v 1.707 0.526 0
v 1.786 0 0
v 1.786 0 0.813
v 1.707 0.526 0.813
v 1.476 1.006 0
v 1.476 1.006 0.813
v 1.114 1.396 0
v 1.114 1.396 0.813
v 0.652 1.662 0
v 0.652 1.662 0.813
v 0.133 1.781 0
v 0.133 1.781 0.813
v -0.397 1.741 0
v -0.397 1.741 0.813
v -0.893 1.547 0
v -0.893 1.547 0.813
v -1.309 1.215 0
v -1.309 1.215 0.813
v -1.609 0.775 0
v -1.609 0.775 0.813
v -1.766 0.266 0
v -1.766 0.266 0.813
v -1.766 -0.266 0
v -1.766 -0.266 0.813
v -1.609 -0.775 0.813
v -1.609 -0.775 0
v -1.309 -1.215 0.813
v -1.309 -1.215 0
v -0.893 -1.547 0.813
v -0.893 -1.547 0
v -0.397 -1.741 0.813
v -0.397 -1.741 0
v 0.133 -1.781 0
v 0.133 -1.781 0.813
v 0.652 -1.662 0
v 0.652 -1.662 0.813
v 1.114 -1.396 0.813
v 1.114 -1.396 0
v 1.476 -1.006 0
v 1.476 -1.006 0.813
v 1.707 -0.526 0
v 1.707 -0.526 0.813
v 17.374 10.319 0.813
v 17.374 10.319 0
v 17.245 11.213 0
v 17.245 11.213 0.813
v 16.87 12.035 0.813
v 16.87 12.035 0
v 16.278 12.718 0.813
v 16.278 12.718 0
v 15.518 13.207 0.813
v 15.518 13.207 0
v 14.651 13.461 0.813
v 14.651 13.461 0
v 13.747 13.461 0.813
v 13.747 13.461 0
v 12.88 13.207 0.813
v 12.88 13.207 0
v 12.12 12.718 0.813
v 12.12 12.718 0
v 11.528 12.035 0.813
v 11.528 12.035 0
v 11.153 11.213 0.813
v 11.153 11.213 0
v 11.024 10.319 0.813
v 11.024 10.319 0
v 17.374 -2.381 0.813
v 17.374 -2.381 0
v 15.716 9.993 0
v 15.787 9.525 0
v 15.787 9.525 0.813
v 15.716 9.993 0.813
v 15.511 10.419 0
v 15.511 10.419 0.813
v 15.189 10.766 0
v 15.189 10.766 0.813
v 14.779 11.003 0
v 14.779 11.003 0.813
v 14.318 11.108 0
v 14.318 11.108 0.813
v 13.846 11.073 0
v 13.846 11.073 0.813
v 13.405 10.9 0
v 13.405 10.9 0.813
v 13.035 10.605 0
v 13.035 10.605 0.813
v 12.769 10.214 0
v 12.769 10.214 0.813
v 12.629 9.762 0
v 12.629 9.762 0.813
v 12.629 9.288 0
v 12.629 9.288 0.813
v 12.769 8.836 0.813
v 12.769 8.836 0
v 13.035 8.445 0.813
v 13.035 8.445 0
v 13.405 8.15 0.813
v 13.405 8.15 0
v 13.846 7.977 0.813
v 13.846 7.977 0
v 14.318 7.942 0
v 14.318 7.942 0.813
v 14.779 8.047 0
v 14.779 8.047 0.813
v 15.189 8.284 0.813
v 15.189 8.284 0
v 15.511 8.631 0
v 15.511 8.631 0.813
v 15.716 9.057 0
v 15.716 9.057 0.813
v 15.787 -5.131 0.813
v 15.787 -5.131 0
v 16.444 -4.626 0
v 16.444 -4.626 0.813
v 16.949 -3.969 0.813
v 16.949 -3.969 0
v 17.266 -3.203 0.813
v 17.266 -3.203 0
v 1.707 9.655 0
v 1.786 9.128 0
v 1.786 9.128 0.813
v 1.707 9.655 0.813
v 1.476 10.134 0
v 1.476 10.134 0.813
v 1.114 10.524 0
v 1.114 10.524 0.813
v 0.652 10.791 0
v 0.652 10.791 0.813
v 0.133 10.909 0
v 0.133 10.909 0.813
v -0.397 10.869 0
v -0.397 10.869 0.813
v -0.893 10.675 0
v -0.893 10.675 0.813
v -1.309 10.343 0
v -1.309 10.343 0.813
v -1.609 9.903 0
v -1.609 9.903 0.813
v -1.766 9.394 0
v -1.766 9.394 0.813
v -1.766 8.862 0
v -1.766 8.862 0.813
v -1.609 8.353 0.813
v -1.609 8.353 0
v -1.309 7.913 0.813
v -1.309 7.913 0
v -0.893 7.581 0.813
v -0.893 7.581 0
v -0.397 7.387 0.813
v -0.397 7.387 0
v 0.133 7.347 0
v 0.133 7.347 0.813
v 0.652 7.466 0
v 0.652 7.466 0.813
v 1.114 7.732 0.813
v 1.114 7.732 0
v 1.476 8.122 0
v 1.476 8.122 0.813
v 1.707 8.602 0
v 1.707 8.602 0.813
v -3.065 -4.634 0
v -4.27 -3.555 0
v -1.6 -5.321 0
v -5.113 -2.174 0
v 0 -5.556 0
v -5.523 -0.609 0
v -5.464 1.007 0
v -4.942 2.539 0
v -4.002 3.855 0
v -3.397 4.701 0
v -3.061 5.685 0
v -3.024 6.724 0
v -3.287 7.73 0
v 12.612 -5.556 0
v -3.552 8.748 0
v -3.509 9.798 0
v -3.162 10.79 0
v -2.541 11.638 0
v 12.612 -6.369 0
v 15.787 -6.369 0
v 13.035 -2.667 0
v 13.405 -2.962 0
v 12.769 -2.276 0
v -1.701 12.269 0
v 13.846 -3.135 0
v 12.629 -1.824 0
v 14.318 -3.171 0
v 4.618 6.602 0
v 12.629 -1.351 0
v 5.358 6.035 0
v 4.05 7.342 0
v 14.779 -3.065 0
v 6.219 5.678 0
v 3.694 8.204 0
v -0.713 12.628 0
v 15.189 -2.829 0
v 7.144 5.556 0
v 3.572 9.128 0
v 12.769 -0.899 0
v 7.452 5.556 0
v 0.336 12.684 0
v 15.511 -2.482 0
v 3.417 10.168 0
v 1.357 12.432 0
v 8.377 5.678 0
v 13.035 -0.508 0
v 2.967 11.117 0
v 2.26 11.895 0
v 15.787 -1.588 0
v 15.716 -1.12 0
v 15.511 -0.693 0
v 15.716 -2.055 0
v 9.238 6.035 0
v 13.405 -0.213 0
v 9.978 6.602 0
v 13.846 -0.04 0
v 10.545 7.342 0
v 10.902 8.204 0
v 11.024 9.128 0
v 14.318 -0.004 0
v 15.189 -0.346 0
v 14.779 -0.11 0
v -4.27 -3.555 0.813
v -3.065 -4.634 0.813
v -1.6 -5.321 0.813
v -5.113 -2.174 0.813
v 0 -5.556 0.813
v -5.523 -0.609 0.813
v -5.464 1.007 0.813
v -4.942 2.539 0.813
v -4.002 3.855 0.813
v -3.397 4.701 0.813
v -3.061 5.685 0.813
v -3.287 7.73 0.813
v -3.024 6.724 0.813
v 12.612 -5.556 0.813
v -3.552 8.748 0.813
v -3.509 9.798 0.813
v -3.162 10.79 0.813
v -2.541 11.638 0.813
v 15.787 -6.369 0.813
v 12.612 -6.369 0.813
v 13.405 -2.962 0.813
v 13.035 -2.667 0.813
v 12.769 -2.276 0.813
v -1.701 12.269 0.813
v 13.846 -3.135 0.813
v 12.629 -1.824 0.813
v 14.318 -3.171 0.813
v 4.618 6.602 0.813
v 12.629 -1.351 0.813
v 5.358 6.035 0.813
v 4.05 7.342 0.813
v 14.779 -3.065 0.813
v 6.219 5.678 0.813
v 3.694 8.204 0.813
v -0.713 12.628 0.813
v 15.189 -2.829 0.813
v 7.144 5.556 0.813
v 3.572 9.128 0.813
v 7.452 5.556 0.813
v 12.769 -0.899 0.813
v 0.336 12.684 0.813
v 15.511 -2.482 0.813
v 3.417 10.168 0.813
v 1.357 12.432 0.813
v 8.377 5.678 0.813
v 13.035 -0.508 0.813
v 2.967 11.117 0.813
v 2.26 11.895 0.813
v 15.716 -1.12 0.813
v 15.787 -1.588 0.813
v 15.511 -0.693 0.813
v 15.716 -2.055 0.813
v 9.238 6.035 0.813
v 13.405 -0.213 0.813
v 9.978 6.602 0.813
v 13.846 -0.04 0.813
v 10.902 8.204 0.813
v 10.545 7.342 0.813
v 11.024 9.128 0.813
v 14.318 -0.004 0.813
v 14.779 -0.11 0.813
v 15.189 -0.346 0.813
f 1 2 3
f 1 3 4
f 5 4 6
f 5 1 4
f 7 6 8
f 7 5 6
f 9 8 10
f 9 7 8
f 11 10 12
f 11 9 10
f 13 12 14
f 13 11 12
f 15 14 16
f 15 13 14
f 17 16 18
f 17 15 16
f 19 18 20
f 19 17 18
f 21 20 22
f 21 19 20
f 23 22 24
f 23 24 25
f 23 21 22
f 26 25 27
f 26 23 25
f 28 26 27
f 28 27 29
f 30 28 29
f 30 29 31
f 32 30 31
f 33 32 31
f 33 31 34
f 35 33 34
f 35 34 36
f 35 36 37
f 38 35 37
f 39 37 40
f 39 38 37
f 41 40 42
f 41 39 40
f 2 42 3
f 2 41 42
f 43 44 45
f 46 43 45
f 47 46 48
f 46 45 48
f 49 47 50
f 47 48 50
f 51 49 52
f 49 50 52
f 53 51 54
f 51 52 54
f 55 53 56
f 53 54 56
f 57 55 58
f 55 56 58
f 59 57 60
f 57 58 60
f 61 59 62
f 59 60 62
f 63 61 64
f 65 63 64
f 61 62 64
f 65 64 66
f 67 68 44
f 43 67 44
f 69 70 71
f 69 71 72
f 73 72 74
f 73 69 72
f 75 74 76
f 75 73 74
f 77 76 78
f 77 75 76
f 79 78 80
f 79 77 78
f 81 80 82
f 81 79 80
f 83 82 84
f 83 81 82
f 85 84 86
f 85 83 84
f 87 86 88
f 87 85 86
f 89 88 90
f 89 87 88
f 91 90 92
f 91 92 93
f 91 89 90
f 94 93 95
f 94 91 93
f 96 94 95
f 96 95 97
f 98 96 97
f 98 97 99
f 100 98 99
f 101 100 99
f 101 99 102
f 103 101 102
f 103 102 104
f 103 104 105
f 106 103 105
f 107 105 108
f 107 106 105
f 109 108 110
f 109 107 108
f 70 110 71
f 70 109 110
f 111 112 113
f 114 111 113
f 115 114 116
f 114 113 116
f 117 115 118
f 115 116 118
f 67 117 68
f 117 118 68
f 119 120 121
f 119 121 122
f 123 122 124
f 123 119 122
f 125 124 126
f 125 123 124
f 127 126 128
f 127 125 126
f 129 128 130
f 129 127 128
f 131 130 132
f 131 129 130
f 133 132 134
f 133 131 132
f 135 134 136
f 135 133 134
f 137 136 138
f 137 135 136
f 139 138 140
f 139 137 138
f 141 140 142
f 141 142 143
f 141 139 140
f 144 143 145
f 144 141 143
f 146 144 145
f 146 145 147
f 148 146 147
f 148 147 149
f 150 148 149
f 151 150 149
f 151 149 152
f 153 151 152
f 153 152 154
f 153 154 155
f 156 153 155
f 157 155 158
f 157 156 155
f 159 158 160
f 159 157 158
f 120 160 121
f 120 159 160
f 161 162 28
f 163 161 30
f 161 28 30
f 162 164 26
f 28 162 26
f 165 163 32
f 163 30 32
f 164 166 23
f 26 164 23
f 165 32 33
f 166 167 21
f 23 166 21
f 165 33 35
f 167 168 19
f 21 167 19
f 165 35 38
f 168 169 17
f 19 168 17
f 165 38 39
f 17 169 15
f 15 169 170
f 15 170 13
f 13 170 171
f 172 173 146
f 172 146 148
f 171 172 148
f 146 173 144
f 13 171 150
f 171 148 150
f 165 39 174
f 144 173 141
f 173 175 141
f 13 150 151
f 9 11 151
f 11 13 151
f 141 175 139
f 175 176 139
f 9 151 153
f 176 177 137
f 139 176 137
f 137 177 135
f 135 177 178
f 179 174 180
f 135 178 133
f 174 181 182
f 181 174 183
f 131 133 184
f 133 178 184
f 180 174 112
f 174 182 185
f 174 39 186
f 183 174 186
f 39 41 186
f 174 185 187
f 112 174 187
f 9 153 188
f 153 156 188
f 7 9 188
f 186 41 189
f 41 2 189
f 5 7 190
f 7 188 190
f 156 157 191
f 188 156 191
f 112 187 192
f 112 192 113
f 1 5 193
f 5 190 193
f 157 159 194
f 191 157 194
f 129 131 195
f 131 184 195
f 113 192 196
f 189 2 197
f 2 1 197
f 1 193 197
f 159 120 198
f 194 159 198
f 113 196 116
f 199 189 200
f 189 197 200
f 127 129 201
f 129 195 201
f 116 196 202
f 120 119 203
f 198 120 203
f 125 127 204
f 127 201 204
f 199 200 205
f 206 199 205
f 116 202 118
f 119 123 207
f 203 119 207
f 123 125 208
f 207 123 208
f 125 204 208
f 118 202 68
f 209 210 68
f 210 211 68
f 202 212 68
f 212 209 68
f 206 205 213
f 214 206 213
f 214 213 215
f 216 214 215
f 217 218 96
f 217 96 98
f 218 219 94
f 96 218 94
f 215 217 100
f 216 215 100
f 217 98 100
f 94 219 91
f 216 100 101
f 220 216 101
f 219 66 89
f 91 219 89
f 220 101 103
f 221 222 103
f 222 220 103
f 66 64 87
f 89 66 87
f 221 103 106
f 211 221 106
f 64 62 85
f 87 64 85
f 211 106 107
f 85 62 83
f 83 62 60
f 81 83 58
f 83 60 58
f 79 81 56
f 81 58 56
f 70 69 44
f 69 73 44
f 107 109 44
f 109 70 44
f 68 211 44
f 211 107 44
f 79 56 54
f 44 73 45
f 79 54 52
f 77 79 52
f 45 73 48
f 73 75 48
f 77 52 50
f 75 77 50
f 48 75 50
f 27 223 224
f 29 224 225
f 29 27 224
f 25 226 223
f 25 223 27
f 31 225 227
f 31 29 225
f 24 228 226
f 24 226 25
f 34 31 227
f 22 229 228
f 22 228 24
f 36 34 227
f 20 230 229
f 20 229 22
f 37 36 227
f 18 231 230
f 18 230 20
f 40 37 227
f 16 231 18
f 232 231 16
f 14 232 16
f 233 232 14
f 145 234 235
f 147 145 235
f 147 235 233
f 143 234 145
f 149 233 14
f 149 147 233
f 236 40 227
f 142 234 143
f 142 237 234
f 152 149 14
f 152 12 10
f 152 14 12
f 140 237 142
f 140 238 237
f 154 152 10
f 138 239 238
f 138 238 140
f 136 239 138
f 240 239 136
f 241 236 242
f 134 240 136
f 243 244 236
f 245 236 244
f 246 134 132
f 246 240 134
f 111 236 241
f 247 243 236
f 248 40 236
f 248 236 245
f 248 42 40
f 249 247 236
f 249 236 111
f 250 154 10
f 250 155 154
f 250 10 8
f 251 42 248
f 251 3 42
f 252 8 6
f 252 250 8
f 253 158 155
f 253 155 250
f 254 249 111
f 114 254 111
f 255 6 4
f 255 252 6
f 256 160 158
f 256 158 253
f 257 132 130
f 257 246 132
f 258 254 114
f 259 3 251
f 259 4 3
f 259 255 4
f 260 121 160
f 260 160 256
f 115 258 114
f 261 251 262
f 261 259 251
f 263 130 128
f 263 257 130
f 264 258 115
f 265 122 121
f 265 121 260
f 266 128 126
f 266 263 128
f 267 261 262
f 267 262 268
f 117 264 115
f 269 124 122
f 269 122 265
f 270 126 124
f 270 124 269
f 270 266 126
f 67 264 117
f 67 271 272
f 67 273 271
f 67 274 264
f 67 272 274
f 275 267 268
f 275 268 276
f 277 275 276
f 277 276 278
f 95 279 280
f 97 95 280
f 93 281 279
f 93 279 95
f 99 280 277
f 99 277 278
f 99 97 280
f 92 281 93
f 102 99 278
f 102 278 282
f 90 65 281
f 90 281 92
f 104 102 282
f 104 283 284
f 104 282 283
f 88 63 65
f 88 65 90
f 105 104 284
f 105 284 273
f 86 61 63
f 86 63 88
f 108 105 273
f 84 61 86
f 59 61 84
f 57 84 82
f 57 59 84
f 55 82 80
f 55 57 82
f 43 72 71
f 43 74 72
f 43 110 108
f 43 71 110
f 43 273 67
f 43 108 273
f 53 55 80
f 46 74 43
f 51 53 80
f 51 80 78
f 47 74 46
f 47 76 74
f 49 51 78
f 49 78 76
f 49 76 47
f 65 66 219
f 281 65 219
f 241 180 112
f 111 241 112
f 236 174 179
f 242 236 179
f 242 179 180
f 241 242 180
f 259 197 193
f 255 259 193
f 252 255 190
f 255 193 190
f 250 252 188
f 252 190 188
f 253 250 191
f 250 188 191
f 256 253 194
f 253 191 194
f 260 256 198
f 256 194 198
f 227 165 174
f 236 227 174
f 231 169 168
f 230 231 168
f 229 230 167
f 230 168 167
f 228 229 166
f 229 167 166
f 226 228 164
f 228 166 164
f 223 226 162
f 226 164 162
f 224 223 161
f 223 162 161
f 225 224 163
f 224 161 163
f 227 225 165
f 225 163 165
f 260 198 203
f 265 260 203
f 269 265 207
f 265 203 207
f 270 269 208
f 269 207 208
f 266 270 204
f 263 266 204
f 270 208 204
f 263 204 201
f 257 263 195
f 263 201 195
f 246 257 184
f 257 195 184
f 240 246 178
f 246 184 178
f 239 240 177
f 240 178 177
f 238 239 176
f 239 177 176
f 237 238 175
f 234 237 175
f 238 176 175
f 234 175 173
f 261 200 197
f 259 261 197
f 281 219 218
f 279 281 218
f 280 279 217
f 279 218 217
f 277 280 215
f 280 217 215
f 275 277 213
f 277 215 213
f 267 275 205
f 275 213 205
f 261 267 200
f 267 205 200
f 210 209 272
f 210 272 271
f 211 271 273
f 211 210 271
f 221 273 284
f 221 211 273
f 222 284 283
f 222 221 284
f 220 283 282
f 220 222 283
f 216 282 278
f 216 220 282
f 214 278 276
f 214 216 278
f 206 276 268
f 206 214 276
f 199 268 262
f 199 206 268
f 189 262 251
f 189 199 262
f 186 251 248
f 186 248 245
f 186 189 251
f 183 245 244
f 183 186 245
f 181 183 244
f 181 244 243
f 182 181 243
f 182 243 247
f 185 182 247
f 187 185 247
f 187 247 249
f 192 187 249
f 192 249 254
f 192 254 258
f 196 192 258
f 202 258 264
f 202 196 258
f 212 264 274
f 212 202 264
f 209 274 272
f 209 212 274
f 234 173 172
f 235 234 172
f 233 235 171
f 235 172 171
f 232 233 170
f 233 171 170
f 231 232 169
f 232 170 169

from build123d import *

# Parameters (mm, degrees)
SKETCH1_R           = 1.7859375
SKETCH1_R_2         = 1.5875
BOSS_EXTRUDE1_DEPTH = 0.8128


with BuildPart() as part:
    # Sketch1 → Boss-Extrude1 (new body)
    with BuildSketch(Plane.XY):
        with BuildLine():
            Line((17.374031657, -2.38125), (17.374031657, 10.31875))
            ThreePointArc((17.374031657, 10.31875), (14.199031657, 13.49375), (11.024031657, 10.31875))
            Line((11.024031657, 10.31875), (11.024031657, 9.128125))
            ThreePointArc((11.024031657, 9.128125), (9.977853691, 6.602427966), (7.452156657, 5.55625))
            Line((7.452156657, 5.55625), (7.14374999, 5.55625))
            ThreePointArc((7.14374999, 5.55625), (4.618052962, 6.602427969), (3.571875, 9.128125))
            ThreePointArc((3.571875, 9.128125), (-0.713207259, 12.628071631), (-3.287058429, 7.730434799))
            ThreePointArc((-3.287058429, 7.730434799), (-3.061446655, 5.68510334), (-4.001636336, 3.854714088))
            ThreePointArc((-4.001636336, 3.854714088), (-5.113201992, -2.17418478), (0, -5.55625))
            Line((0, -5.55625), (12.611531657, -5.55625))
            Line((12.611531657, -5.55625), (12.611531657, -6.36905))
            Line((12.611531657, -6.36905), (15.786531657, -6.36905))
            Line((15.786531657, -6.36905), (15.786531657, -5.130880657))
            ThreePointArc((15.786531657, -5.130880657), (16.948662314, -3.96875), (17.374031657, -2.38125))
        make_face()
        Circle(SKETCH1_R, mode=Mode.SUBTRACT)
        with Locations((14.199031657, -1.5875)):
            Circle(SKETCH1_R_2, mode=Mode.SUBTRACT)
        with Locations((0, 9.128125)):
            Circle(SKETCH1_R, mode=Mode.SUBTRACT)
        with Locations((14.199031657, 9.525)):
            Circle(SKETCH1_R_2, mode=Mode.SUBTRACT)
    extrude(amount=BOSS_EXTRUDE1_DEPTH)


solid = part.part
